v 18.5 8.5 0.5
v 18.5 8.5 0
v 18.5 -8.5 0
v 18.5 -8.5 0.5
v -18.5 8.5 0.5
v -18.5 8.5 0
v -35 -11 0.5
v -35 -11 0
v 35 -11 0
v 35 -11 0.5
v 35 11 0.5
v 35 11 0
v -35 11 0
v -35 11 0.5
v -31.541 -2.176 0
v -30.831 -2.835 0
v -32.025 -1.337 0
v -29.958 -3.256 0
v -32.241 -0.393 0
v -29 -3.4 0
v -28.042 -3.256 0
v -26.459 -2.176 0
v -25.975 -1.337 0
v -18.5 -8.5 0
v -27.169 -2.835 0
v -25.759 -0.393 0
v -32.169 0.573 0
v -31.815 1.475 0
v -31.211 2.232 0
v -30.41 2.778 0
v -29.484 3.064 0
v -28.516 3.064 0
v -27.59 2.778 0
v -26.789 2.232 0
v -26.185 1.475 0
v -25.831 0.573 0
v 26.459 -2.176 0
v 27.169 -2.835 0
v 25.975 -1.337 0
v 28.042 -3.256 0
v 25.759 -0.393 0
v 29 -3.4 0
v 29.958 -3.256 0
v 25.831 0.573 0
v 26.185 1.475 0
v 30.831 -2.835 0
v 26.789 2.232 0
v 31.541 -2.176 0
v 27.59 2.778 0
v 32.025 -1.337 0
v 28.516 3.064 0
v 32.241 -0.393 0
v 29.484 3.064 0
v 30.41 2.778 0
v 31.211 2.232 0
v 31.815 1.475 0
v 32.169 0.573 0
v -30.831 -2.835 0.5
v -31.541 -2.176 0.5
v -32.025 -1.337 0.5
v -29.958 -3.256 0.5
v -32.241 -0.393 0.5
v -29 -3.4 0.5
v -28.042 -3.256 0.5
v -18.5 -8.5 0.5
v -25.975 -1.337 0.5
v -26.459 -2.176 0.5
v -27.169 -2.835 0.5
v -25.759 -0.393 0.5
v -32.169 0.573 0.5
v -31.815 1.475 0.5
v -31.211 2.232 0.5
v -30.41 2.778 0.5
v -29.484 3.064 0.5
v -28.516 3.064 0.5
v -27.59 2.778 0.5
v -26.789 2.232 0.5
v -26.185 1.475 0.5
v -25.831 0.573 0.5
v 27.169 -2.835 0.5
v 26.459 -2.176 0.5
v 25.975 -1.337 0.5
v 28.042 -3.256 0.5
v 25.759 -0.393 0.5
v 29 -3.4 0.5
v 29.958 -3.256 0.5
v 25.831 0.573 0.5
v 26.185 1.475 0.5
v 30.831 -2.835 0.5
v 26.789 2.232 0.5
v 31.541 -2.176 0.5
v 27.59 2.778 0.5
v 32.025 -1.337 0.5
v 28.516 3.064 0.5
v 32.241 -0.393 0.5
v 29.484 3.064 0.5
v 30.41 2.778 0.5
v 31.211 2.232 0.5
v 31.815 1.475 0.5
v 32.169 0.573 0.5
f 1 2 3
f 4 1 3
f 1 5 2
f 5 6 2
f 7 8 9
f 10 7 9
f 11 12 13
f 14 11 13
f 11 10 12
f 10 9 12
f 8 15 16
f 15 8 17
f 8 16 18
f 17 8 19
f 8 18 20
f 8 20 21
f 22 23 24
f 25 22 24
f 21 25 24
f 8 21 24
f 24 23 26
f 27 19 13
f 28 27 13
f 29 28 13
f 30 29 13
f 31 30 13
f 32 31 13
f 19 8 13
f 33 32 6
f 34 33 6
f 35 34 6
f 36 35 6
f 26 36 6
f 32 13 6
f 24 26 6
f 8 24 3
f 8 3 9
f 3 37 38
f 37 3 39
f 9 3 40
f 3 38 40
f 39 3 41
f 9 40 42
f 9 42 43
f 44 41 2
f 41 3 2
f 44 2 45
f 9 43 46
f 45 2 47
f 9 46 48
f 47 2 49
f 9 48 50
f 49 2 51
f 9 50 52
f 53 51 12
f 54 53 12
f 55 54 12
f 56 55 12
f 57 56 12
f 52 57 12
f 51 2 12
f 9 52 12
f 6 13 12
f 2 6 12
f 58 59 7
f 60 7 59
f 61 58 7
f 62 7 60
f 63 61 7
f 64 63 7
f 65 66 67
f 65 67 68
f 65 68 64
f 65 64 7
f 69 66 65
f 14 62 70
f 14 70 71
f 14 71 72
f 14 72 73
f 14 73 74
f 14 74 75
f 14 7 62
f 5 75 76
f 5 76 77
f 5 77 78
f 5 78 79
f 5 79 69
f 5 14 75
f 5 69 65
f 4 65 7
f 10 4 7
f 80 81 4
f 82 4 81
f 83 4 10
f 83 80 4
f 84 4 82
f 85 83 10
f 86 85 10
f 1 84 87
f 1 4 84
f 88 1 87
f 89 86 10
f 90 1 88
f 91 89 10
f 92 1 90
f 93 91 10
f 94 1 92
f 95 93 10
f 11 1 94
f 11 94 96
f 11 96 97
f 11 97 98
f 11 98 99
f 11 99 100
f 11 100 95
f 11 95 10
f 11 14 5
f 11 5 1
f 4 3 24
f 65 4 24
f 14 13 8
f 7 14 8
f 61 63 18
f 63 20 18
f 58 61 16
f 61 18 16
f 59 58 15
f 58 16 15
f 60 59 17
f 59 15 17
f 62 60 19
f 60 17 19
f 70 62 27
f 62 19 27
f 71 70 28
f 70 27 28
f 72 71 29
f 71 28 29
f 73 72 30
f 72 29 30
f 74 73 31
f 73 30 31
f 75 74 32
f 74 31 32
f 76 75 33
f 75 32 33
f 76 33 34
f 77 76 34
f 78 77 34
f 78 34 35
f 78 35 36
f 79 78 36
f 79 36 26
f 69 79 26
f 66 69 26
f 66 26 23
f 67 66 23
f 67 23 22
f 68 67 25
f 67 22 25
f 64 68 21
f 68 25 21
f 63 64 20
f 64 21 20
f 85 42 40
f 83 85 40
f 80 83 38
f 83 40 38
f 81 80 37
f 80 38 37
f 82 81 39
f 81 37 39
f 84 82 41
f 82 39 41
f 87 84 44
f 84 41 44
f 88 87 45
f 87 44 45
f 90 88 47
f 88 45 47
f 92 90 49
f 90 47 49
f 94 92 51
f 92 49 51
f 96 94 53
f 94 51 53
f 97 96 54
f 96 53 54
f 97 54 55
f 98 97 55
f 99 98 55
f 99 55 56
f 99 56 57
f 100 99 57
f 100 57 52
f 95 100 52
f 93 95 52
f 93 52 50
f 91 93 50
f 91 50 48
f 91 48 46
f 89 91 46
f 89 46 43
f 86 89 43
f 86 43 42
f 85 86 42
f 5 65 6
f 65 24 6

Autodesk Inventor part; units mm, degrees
ref_plane "YZ Plane" through (0, 0, 0) normal (1, 0, 0) x (0, 1, 0)
ref_plane "XZ Plane" through (0, 0, 0) normal (0, 1, 0) x (-1, 0, 0)
ref_plane "XY Plane" through (0, 0, 0) normal (0, 0, 1) x (1, 0, 0)
ref_plane "Arbeitsebene1" through (0, 0, 0) normal (0, 0, 1) x (1, 0, 0)
sketch "Skizze1" plane through (0, 0, 0) normal (0, 0, 1) x (1, 0, 0)
  circle A0 centre (12, 2.9) radius 1.5 projected
  circle A1 centre (-12, 2.9) radius 1.5 projected
  line L0 (2.5, 12.9) -> (2.5, -7.1) projected
  line L1 (2.5, -7.1) -> (2.25, -7.1) projected
  line L2 (2.25, -7.1) -> (2, -7.1) projected
  line L3 (2, -7.1) -> (1.75, -7.1) projected
  line L4 (1.75, -7.1) -> (1.5, -7.1) projected
  line L5 (1.5, -7.1) -> (1.25, -7.1) projected
  line L6 (1.25, -7.1) -> (1, -7.1) projected
  line L7 (1, -7.1) -> (0.75, -7.1) projected
  line L8 (0.75, -7.1) -> (0.5, -7.1) projected
  line L9 (0.5, -7.1) -> (0.25, -7.1) projected
  line L10 (0.25, -7.1) -> (0, -7.1) projected
  line L11 (0, -7.1) -> (-0.25, -7.1) projected
  line L12 (-0.25, -7.1) -> (-0.5, -7.1) projected
  line L13 (-0.5, -7.1) -> (-0.75, -7.1) projected
  line L14 (-0.75, -7.1) -> (-1, -7.1) projected
  line L15 (-1, -7.1) -> (-1.25, -7.1) projected
  line L16 (-1.25, -7.1) -> (-1.5, -7.1) projected
  line L17 (-1.5, -7.1) -> (-1.75, -7.1) projected
  line L18 (-1.75, -7.1) -> (-2, -7.1) projected
  line L19 (-2, -7.1) -> (-2.25, -7.1) projected
  line L20 (-2.25, -7.1) -> (-2.5, -7.1) projected
  line L21 (-2.5, -7.1) -> (-2.5, 12.9) projected
  line L22 (-2.5, 12.9) -> (-38, 12.9) projected
  line L23 (-38, 12.9) -> (-38, -12.9) projected
  line L24 (-38, -12.9) -> (38, -12.9) projected
  line L25 (38, -12.9) -> (38, 12.9) projected
  line L26 (38, 12.9) -> (2.5, 12.9) projected
  line L27 (35, 11) -> (-35, 11)
  line L28 (-35, 11) -> (-35, -11)
  line L29 (-35, -11) -> (35, -11)
  line L30 (35, -11) -> (35, 11)
  line L31 (35, 11) -> (-35, -11) construction
  line L32 (-35, 11) -> (35, -11) construction
  line L33 (-32.5, 8.5) -> (32.5, 8.5)
  line L34 (32.5, 8.5) -> (32.5, -8.5)
  line L35 (32.5, -8.5) -> (-32.5, -8.5)
  line L36 (-32.5, -8.5) -> (-32.5, 8.5)
  line L37 (-32.5, -8.5) -> (-18.5, -8.5)
  line L38 (-18.5, -8.5) -> (-18.5, 8.5)
  line L39 (-18.5, 8.5) -> (-32.5, 8.5)
  line L40 (-32.5, 8.5) -> (-32.5, -8.5)
  line L41 (32.5, 8.5) -> (18.5, 8.5)
  line L42 (18.5, 8.5) -> (18.5, -8.5)
  line L43 (18.5, -8.5) -> (32.5, -8.5)
  line L44 (32.5, -8.5) -> (32.5, 8.5)
  point P0 (0, 0)
  dimension "d0" = 70
  dimension "d1" = 22
  dimension "d2" = 2.5
  dimension "d5" = 14
  dimension "d6" = 14
extrude "Extrusion1" add sketch "Skizze1" along normal blind 0.5 contours L27 L30 L29 L28 L21 L33 L36 L35 L34 L0 | L0 L33 L21 L27 | L33 L34 L35 L42 | L38 L35 L36 L33
sketch "Skizze2" plane through (0, 0, 0.5) normal (0, 0, 1) x (1, 0, 0)
  circle A0 centre (-29, -0.15) radius 1.6 projected
  circle A1 centre (29, -0.15) radius 1.6 projected
  point P0 (0, 0)
hole "Bohrung1" at (-29, -0.15, 0.5) at (29, -0.15, 0.5) direction (0, 0, -1) diameter 3.5 end through all counterbore diameter 6.5 counterbore depth 2
properties part number "00_Gasket"
